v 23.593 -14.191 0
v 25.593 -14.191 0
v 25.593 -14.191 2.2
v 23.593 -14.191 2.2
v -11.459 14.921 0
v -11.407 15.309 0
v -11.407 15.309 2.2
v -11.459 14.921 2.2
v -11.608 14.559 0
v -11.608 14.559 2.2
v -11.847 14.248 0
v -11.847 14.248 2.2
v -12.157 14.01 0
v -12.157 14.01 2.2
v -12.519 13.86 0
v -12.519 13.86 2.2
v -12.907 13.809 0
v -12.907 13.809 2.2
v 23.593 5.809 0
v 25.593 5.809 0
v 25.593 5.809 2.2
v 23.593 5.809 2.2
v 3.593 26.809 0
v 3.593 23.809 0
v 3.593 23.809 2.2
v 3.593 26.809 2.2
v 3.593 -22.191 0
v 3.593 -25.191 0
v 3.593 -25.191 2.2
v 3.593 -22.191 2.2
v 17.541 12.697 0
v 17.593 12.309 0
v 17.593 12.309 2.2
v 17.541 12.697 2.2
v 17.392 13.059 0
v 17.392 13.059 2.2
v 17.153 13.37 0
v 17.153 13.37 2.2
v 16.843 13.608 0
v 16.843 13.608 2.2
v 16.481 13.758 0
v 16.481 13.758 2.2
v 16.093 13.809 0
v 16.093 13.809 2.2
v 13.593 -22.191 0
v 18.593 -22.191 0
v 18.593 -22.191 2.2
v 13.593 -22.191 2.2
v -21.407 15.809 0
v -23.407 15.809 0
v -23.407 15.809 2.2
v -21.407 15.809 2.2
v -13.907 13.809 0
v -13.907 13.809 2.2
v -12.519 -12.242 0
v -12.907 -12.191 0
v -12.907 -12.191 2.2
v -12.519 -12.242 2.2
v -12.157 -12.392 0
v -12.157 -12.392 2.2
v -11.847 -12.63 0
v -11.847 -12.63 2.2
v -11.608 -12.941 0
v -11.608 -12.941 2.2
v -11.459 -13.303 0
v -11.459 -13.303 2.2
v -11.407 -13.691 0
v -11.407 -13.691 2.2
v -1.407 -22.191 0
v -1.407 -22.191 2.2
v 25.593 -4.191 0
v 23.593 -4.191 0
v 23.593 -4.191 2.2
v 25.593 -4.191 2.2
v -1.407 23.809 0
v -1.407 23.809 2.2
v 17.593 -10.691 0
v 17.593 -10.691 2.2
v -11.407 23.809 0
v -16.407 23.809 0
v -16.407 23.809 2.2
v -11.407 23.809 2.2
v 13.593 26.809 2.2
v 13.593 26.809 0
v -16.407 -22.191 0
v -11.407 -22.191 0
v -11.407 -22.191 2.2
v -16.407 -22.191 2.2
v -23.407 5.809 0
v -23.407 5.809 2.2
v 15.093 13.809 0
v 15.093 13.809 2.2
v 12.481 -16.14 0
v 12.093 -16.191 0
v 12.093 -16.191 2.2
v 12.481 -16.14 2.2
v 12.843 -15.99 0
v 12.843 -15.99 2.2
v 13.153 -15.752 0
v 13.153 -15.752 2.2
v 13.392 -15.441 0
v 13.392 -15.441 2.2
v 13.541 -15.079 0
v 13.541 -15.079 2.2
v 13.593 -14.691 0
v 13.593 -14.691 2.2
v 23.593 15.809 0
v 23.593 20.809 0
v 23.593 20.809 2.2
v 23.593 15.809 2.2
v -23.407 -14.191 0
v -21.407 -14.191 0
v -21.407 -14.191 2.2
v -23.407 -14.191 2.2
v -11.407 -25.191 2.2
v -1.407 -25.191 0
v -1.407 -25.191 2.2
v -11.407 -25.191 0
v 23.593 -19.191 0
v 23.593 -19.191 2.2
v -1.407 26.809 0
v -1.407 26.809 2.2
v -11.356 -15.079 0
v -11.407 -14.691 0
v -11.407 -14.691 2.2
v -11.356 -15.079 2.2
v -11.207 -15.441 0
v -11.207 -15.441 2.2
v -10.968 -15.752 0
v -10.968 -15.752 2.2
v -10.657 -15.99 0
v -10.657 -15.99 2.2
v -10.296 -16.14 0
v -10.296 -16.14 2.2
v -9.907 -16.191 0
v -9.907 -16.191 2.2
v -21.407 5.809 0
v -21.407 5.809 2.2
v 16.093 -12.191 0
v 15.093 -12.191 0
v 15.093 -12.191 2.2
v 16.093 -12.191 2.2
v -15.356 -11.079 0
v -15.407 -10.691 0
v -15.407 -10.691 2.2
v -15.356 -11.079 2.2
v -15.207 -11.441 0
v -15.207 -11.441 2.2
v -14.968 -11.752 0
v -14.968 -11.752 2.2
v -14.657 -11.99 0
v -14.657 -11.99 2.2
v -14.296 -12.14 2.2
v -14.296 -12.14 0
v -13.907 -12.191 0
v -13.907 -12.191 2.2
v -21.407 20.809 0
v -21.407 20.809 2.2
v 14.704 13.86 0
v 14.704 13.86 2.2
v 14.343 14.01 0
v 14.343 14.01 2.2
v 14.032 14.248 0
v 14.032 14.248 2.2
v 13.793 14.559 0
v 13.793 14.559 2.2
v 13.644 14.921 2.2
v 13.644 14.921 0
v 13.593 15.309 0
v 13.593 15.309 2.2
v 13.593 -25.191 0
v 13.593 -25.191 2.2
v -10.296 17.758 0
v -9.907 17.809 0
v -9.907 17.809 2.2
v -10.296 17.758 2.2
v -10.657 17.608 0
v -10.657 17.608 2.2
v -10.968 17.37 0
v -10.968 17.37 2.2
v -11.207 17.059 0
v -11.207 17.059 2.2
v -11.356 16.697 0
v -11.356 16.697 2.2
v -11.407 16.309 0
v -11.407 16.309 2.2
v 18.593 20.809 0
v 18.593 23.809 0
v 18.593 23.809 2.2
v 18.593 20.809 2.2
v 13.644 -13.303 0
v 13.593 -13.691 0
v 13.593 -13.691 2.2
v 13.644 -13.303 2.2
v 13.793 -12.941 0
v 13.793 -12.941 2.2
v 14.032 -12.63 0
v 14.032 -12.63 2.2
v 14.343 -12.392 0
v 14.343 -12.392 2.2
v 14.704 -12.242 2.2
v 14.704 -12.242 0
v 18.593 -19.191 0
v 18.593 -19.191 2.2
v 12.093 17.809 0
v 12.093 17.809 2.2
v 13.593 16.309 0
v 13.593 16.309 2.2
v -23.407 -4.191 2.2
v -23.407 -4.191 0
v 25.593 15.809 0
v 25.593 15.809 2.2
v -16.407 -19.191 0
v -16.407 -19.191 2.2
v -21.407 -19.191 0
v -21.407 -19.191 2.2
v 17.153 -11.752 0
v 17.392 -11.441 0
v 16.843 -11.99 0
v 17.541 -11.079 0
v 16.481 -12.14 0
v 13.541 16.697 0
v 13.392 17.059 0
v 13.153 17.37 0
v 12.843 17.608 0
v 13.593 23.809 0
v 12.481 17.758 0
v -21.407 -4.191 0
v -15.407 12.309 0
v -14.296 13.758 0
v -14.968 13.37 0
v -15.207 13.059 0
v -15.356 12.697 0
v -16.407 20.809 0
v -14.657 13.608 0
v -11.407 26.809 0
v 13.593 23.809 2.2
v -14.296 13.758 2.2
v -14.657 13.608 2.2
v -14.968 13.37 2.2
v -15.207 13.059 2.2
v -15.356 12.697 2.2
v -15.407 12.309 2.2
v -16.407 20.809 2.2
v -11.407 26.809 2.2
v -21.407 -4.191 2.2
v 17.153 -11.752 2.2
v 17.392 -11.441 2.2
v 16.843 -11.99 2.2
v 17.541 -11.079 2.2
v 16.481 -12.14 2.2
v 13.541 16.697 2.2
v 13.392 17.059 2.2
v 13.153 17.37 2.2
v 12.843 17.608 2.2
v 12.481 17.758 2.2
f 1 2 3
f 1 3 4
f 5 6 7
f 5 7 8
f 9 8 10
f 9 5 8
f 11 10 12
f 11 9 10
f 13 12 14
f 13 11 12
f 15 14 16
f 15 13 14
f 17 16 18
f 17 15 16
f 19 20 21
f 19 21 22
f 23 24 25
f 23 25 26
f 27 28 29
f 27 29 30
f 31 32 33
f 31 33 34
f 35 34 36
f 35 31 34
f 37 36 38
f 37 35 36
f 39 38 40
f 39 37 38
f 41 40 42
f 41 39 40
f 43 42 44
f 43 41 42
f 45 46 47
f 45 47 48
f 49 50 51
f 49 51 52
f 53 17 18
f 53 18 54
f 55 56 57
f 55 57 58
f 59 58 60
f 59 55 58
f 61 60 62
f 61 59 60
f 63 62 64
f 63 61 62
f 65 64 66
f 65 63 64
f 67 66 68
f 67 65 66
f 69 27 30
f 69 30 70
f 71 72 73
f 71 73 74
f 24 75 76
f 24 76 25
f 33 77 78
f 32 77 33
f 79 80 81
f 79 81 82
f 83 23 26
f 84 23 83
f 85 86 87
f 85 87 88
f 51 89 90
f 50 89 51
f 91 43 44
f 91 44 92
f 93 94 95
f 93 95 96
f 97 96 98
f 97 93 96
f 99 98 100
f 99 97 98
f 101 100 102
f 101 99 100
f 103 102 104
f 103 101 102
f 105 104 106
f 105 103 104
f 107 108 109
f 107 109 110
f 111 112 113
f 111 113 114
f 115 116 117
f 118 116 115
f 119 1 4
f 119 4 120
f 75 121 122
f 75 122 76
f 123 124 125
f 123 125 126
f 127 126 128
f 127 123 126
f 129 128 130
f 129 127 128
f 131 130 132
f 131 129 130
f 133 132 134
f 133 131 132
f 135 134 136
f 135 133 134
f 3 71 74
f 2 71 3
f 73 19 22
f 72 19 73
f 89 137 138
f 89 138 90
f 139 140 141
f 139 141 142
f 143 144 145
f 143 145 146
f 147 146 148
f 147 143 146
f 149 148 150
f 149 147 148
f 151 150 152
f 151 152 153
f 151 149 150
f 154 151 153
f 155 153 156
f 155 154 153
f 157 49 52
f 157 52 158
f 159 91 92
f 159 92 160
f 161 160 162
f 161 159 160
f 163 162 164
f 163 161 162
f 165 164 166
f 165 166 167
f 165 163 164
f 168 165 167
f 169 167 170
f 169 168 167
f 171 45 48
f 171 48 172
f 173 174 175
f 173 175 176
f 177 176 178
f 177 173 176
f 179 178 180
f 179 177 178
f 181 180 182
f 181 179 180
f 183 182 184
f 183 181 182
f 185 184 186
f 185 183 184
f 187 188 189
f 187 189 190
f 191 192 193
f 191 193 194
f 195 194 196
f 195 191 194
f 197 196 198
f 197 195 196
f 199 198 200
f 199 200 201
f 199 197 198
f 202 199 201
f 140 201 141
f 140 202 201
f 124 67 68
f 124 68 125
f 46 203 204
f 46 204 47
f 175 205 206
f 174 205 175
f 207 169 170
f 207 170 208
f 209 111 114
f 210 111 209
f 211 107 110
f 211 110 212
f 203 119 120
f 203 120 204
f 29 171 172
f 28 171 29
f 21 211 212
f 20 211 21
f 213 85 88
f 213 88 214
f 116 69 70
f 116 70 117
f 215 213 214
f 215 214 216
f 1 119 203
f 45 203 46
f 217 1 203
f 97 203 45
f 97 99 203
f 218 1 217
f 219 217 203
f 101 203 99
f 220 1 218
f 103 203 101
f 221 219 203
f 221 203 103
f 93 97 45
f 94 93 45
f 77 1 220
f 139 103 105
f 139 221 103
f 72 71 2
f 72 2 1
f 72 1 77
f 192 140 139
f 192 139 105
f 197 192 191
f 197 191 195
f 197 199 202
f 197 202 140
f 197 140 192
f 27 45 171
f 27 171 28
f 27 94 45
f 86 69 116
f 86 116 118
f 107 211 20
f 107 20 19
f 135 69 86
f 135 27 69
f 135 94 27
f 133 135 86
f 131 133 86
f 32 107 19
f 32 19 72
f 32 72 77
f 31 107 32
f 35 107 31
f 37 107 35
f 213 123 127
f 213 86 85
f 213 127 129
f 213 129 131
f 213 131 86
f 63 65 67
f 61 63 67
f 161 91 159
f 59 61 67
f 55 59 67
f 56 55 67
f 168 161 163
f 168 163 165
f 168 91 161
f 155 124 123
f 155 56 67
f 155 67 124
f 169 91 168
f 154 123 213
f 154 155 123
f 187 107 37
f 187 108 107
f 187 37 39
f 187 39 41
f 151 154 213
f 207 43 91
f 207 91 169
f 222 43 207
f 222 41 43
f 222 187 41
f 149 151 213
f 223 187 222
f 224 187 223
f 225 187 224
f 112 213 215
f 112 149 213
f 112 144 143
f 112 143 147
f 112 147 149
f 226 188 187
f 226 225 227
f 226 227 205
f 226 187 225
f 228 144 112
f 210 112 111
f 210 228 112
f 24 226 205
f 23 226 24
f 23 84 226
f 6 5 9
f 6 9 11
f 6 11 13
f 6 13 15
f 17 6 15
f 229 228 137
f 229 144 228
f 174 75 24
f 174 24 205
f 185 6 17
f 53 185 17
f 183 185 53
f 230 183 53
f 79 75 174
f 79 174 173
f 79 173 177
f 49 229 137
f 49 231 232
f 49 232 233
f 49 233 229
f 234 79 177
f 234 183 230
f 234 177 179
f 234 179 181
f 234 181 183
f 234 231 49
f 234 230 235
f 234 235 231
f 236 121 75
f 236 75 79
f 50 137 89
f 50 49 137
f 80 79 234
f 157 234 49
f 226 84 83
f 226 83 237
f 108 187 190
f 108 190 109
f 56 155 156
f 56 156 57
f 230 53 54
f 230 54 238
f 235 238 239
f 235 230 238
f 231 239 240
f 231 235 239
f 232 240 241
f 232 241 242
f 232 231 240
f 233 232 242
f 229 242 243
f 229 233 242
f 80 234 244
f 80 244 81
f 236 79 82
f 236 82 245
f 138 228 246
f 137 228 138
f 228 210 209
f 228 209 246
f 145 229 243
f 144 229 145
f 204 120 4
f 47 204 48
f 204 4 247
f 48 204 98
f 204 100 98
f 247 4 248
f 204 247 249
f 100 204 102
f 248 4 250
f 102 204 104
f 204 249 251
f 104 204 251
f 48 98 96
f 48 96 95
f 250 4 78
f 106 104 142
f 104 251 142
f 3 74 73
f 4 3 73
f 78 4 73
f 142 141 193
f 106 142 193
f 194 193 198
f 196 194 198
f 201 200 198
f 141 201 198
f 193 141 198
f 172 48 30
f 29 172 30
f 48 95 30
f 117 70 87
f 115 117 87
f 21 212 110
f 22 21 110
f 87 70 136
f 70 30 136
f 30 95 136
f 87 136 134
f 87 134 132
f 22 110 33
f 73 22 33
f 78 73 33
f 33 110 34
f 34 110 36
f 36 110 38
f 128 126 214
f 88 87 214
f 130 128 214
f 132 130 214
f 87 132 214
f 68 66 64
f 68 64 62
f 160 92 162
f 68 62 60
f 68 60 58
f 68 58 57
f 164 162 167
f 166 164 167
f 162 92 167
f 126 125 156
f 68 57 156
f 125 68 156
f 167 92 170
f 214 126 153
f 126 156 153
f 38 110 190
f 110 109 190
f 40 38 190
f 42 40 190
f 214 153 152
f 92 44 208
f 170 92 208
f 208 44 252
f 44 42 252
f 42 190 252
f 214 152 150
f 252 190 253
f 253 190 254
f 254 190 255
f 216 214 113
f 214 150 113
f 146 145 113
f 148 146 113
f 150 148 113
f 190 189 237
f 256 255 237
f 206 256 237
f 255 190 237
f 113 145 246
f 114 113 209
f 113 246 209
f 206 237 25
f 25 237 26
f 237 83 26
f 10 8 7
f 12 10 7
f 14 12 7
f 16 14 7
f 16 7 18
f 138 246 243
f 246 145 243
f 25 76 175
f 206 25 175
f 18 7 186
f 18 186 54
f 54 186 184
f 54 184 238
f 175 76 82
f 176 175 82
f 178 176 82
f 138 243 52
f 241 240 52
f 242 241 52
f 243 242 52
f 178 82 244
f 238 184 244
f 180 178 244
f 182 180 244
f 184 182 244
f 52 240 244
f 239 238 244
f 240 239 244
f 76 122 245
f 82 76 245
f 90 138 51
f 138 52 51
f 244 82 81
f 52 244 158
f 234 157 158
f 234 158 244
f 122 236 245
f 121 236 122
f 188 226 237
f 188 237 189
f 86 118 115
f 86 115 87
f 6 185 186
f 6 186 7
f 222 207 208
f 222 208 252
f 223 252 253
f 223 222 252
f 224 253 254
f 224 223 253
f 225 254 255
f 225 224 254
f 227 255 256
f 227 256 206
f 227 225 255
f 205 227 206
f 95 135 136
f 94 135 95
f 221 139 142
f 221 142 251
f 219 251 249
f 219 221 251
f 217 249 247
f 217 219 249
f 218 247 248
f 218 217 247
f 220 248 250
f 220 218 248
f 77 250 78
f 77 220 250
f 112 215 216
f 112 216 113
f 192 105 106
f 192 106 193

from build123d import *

# Parameters (mm, degrees)
EXTRUDE_1_DEPTH = 2.2


with BuildPart() as part:
    # Model → 凸台-拉伸1 (new body)
    with BuildSketch(Plane.XY):
        Polygon((-11.407474747, -25.191111111), (-11.407474747, -22.191111111), (-16.407474747, -22.191111111), (-16.407474747, -19.191111111), (-21.407474747, -19.191111111), (-21.407474747, -14.191111111), (-23.407474747, -14.191111111), (-23.407474747, -4.191111111), (-21.407474747, -4.191111111), (-21.407474747, 5.808888889), (-23.407474747, 5.808888889), (-23.407474747, 15.808888889), (-21.407474747, 15.808888889), (-21.407474747, 20.808888889), (-16.407474747, 20.808888889), (-16.407474747, 23.808888889), (-11.407474747, 23.808888889), (-11.407474747, 26.808888889), (-1.407474747, 26.808888889), (-1.407474747, 23.808888889), (3.592525253, 23.808888889), (3.592525253, 26.808888889), (13.592525253, 26.808888889), (13.592525253, 23.808888889), (18.592525253, 23.808888889), (18.592525253, 20.808888889), (23.592525253, 20.808888889), (23.592525253, 15.808888889), (25.592525253, 15.808888889), (25.592525253, 5.808888889), (23.592525253, 5.808888889), (23.592525253, -4.191111111), (25.592525253, -4.191111111), (25.592525253, -14.191111111), (23.592525253, -14.191111111), (23.592525253, -19.191111111), (18.592525253, -19.191111111), (18.592525253, -22.191111111), (13.592525253, -22.191111111), (13.592525253, -25.191111111), (3.592525253, -25.191111111), (3.592525253, -22.191111111), (-1.407474747, -22.191111111), (-1.407474747, -25.191111111), align=None)
        with BuildLine():
            Line((16.092525253, 13.808888889), (15.092525253, 13.808888889))
            ThreePointArc((15.092525253, 13.808888889), (14.031865081, 14.248228717), (13.592525253, 15.308888889))
            Line((13.592525253, 15.308888889), (13.592525253, 16.308888889))
            ThreePointArc((13.592525253, 16.308888889), (13.153185424, 17.369549061), (12.092525253, 17.808888889))
            Line((12.092525253, 17.808888889), (-9.907474747, 17.808888889))
            ThreePointArc((-9.907474747, 17.808888889), (-10.968134919, 17.369549061), (-11.407474747, 16.308888889))
            Line((-11.407474747, 16.308888889), (-11.407474747, 15.308888889))
            ThreePointArc((-11.407474747, 15.308888889), (-11.846814576, 14.248228717), (-12.907474747, 13.808888889))
            Line((-12.907474747, 13.808888889), (-13.907474747, 13.808888889))
            ThreePointArc((-13.907474747, 13.808888889), (-14.968134919, 13.369549061), (-15.407474747, 12.308888889))
            Line((-15.407474747, 12.308888889), (-15.407474747, -10.691111111))
            ThreePointArc((-15.407474747, -10.691111111), (-14.968134919, -11.751771283), (-13.907474747, -12.191111111))
            Line((-13.907474747, -12.191111111), (-12.907474747, -12.191111111))
            ThreePointArc((-12.907474747, -12.191111111), (-11.846814576, -12.630450939), (-11.407474747, -13.691111111))
            Line((-11.407474747, -13.691111111), (-11.407474747, -14.691111111))
            ThreePointArc((-11.407474747, -14.691111111), (-10.968134919, -15.751771283), (-9.907474747, -16.191111111))
            Line((-9.907474747, -16.191111111), (12.092525253, -16.191111111))
            ThreePointArc((12.092525253, -16.191111111), (13.153185424, -15.751771283), (13.592525253, -14.691111111))
            Line((13.592525253, -14.691111111), (13.592525253, -13.691111111))
            ThreePointArc((13.592525253, -13.691111111), (14.031865081, -12.630450939), (15.092525253, -12.191111111))
            Line((15.092525253, -12.191111111), (16.092525253, -12.191111111))
            ThreePointArc((16.092525253, -12.191111111), (17.153185424, -11.751771283), (17.592525253, -10.691111111))
            Line((17.592525253, -10.691111111), (17.592525253, 12.308888889))
            ThreePointArc((17.592525253, 12.308888889), (17.153185424, 13.369549061), (16.092525253, 13.808888889))
        make_face(mode=Mode.SUBTRACT)
    extrude(amount=EXTRUDE_1_DEPTH)


solid = part.part
